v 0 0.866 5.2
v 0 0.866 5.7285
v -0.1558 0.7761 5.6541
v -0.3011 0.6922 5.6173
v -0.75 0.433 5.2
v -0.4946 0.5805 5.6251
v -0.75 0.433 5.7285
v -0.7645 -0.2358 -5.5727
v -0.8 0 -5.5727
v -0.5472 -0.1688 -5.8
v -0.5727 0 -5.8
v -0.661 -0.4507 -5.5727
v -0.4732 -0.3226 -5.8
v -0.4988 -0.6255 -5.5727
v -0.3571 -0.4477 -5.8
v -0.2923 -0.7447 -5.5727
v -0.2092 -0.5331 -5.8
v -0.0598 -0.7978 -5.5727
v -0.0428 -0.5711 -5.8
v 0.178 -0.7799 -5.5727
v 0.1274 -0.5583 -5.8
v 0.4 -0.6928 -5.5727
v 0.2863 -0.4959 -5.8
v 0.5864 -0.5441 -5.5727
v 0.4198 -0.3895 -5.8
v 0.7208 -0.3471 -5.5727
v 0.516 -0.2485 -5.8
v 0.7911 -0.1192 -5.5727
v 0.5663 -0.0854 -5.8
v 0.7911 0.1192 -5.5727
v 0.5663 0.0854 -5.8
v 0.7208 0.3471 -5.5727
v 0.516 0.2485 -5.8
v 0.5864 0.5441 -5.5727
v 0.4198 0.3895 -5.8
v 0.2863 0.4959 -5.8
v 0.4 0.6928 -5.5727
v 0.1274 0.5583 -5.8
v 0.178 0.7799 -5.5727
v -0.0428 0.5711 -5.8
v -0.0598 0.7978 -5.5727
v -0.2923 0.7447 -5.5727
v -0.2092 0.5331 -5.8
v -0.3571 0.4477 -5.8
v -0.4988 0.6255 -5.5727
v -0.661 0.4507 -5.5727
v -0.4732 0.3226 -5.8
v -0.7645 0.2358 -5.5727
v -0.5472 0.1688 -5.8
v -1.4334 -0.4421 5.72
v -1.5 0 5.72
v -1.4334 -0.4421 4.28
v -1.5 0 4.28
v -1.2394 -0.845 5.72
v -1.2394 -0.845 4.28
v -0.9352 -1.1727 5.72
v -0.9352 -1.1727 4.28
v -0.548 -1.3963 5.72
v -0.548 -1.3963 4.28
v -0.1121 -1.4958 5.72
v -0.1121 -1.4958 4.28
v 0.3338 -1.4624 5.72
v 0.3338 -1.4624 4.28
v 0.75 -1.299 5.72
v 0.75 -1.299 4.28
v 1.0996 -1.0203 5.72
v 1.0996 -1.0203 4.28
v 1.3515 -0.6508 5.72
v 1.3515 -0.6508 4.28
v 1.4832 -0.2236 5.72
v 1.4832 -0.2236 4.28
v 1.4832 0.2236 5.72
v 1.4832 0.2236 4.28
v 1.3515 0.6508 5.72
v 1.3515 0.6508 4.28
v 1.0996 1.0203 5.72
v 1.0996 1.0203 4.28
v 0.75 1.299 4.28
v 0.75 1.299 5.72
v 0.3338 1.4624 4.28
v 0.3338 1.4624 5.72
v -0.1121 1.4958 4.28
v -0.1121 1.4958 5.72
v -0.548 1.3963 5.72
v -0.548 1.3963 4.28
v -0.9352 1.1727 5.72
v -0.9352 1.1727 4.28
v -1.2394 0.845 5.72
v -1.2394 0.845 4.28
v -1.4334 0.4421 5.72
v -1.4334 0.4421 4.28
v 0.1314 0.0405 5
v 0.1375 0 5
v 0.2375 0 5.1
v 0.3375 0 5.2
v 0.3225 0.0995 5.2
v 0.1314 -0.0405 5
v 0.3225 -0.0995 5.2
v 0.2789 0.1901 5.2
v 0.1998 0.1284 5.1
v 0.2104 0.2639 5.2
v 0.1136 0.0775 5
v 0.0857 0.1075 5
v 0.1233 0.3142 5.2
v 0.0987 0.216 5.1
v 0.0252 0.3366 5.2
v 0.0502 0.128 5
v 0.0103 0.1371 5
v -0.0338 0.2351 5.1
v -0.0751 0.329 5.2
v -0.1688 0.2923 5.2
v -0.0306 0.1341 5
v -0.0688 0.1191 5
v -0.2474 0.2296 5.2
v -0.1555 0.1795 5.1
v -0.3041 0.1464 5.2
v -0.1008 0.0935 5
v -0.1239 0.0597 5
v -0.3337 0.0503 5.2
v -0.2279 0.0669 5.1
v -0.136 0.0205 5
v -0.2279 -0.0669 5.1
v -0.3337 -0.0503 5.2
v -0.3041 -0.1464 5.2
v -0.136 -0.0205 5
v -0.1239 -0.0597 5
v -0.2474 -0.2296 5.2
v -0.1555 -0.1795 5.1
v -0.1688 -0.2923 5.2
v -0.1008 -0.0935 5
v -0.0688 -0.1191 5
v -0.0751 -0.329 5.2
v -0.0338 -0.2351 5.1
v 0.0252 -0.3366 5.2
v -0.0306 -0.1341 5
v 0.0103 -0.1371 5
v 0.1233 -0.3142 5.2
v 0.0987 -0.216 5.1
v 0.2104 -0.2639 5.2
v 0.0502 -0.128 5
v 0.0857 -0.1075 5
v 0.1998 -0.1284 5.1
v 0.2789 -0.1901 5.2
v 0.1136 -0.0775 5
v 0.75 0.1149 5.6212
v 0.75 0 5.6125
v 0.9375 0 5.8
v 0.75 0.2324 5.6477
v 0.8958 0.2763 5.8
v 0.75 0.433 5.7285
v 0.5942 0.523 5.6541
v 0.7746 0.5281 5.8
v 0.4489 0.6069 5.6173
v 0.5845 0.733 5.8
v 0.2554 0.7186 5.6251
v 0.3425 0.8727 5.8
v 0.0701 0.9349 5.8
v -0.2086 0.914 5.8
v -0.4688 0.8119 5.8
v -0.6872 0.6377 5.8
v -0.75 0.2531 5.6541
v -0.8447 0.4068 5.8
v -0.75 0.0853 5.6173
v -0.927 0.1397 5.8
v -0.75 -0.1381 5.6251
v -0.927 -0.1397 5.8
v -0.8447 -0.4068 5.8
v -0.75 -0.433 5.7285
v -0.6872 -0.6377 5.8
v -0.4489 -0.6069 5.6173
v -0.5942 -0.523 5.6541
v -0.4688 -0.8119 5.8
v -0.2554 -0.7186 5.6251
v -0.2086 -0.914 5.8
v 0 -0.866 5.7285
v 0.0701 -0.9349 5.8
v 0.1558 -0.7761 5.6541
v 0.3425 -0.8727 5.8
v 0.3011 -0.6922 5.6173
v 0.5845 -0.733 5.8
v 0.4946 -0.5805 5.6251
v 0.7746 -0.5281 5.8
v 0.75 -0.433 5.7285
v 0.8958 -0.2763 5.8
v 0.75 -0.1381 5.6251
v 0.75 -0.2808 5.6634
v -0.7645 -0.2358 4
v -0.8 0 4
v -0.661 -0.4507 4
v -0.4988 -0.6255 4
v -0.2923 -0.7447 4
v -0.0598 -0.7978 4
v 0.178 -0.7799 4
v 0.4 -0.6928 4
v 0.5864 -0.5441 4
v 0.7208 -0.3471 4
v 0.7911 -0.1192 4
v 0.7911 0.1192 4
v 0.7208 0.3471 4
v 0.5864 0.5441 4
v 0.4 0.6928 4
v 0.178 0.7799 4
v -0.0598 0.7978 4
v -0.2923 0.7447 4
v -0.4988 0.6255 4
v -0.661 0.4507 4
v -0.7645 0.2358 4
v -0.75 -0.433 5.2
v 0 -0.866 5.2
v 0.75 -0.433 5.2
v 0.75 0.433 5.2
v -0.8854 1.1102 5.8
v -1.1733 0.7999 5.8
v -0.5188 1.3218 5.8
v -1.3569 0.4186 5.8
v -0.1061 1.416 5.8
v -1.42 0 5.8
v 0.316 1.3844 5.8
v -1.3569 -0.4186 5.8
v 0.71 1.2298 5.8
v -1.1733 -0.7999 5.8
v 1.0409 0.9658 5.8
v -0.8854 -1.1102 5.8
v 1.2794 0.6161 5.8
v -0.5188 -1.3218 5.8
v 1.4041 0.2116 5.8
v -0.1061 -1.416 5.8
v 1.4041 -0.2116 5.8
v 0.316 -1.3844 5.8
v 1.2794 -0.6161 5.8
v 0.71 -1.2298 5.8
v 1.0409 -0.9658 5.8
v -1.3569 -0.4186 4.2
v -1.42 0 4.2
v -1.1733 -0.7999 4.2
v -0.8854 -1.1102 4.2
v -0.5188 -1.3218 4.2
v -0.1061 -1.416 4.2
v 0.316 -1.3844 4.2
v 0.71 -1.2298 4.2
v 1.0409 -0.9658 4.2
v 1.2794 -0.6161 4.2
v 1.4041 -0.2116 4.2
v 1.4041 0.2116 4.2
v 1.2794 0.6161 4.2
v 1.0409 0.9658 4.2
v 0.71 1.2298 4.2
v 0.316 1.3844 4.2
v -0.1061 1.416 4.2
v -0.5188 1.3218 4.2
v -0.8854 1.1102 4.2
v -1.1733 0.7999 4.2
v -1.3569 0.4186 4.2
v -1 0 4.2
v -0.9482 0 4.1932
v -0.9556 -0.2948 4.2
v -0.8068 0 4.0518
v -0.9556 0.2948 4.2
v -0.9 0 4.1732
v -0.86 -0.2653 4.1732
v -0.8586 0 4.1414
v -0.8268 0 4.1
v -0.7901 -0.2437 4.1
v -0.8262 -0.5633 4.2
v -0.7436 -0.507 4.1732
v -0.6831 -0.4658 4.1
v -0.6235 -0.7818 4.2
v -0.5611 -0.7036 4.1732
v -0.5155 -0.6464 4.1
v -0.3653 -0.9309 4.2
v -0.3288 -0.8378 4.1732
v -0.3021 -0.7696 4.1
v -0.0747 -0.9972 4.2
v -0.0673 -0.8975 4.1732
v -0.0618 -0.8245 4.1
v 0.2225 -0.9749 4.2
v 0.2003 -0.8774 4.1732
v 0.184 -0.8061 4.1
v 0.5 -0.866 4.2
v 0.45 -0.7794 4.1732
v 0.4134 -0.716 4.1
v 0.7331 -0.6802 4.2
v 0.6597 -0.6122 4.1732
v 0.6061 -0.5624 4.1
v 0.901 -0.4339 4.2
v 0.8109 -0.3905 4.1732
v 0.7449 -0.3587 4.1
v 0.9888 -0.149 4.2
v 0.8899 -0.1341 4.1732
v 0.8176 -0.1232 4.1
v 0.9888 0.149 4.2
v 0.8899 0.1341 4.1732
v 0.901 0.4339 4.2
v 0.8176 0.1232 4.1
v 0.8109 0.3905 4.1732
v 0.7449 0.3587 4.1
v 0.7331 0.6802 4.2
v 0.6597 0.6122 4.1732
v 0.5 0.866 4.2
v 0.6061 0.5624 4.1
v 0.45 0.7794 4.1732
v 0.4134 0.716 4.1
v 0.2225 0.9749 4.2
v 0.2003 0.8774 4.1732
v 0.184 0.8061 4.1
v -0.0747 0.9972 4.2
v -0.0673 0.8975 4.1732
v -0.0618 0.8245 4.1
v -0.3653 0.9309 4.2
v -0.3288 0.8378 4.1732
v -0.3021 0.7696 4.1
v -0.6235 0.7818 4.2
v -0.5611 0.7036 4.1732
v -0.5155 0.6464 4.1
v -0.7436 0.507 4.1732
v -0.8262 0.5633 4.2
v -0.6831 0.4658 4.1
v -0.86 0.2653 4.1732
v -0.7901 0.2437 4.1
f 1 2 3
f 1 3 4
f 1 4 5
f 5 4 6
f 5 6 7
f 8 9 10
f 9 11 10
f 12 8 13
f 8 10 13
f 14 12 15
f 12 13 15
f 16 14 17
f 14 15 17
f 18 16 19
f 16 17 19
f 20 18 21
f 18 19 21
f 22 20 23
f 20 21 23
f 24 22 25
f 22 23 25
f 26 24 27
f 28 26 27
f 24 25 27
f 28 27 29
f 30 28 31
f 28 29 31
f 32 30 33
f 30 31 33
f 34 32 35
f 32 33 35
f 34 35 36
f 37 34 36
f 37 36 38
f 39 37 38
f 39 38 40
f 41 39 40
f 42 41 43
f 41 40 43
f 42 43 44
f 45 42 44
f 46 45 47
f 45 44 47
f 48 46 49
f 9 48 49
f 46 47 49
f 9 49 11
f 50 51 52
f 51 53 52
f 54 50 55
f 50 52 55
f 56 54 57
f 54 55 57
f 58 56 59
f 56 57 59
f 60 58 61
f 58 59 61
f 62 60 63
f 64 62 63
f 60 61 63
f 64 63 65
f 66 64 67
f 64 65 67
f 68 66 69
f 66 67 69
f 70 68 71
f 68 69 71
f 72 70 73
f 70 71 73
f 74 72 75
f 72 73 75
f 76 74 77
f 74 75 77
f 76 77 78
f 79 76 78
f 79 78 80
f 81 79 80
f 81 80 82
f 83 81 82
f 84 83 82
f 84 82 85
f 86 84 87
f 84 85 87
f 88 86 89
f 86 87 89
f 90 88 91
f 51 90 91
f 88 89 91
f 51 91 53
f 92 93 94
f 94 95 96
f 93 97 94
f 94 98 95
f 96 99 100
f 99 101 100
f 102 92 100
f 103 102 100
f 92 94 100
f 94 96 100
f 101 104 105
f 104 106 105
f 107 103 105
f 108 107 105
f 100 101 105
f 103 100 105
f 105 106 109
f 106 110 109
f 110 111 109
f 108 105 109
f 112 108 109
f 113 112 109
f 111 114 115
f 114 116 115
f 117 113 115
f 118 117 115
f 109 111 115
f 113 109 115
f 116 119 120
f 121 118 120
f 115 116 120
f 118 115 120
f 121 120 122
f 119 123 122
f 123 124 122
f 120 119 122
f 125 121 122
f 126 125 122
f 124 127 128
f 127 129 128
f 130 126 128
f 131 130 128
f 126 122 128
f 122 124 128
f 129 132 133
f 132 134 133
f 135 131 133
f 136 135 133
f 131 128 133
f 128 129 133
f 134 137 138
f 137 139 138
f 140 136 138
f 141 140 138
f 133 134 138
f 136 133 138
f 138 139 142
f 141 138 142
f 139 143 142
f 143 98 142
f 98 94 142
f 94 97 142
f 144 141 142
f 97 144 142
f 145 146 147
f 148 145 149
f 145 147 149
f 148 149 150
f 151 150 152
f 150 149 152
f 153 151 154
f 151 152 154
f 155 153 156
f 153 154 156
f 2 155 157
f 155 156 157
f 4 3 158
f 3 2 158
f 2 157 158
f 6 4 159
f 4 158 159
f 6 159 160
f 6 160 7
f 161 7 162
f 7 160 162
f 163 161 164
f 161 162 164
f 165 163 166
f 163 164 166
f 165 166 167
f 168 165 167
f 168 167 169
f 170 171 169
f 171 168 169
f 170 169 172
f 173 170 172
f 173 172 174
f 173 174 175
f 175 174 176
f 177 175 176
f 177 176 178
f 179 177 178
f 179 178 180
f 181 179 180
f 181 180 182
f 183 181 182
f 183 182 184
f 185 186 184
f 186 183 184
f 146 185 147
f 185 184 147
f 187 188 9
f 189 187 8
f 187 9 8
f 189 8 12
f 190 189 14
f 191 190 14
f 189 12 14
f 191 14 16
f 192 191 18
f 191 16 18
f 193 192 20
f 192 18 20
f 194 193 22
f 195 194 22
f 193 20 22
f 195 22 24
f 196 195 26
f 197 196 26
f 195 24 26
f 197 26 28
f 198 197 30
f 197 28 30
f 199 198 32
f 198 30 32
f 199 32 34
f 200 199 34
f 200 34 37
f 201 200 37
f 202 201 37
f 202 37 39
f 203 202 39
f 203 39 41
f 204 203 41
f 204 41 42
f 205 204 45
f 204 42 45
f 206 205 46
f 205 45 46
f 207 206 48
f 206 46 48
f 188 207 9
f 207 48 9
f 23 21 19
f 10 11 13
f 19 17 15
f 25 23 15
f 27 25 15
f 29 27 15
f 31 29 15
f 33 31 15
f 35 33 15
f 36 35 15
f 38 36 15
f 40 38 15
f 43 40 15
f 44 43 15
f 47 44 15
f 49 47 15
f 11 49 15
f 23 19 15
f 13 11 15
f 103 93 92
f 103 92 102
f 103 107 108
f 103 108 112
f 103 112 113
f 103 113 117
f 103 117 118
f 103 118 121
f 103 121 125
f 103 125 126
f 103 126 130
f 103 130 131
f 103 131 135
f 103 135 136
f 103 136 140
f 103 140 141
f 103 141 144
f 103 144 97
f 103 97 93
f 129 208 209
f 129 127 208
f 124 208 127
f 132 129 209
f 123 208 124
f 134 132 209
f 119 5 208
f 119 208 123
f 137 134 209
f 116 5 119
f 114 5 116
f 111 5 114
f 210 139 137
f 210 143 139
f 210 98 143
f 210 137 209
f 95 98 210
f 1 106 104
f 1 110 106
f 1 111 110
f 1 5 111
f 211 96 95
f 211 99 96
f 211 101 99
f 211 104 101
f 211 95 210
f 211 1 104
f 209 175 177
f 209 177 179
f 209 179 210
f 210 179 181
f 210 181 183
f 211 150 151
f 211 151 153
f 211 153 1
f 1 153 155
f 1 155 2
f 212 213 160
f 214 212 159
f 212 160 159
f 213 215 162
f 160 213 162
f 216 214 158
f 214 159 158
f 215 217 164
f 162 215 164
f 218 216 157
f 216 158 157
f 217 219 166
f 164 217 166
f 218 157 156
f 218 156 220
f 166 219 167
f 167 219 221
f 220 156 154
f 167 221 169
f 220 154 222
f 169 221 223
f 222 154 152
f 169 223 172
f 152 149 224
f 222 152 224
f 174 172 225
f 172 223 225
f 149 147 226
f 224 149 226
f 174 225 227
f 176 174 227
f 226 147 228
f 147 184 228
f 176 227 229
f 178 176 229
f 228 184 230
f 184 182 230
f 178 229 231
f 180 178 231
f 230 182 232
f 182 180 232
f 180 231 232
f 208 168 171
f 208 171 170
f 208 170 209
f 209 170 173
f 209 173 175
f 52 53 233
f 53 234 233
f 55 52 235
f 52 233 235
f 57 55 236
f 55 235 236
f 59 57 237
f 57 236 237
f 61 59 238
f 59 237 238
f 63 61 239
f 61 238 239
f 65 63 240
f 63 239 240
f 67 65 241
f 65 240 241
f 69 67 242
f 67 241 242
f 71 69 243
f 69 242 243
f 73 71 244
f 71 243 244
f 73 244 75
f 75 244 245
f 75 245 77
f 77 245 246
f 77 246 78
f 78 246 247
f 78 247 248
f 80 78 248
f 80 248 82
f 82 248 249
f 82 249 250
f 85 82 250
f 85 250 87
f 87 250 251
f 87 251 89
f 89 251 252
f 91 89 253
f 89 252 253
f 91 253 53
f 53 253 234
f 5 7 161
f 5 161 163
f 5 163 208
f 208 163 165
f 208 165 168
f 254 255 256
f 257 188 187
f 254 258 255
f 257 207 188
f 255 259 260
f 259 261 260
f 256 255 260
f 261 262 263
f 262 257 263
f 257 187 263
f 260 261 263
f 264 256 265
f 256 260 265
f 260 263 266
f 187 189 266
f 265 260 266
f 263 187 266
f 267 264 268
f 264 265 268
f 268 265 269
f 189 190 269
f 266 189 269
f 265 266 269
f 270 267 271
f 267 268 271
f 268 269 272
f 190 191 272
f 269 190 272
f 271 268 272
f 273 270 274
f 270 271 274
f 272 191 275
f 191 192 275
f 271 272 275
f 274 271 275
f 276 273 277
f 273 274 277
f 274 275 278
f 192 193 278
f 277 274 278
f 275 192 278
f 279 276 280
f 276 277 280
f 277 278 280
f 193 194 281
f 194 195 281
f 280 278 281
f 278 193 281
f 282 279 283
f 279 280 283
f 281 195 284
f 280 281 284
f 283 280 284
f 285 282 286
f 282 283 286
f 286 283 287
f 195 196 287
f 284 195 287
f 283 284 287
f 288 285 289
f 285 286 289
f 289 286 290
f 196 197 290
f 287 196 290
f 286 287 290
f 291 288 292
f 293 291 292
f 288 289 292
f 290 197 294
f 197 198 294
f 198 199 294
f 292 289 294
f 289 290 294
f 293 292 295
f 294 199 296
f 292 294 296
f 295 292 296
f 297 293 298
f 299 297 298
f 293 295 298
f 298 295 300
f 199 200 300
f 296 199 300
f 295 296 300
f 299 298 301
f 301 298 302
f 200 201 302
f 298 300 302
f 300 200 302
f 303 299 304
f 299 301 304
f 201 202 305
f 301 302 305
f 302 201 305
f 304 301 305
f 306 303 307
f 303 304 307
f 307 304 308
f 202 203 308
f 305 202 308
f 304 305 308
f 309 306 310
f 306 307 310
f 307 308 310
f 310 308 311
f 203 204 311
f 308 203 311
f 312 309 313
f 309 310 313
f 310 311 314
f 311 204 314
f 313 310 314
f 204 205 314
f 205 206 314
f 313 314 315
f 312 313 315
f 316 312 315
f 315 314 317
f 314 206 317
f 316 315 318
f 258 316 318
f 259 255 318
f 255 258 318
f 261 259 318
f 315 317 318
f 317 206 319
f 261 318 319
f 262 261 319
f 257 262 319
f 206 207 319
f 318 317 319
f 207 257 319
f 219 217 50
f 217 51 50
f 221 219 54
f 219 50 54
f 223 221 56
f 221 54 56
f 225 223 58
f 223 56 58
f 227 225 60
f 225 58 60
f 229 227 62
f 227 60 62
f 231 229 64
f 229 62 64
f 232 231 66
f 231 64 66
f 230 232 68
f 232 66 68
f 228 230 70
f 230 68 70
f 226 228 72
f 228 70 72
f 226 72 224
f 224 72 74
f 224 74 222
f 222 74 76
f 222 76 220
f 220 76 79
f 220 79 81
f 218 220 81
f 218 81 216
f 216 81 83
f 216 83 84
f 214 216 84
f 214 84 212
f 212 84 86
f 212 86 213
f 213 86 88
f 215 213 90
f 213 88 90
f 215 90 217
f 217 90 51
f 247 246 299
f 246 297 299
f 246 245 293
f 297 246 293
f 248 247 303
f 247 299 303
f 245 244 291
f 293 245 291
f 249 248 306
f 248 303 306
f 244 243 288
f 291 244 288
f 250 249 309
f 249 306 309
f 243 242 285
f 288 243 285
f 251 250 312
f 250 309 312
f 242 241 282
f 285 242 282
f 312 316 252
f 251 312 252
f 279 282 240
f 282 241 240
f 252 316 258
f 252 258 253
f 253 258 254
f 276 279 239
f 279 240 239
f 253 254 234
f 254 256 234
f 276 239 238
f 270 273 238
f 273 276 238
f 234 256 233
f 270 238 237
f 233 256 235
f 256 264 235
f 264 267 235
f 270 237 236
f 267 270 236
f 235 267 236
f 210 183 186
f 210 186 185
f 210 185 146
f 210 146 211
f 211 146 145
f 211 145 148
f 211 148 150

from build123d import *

# Parameters (mm, degrees)
CUT_EXTRUDE1_DEPTH = 0.6
SKETCH4_R          = 0.9375
CUT_EXTRUDE2_DEPTH = 0.8
CUT_EXTRUDE2_DRAFT = -45


with BuildPart() as part:
    # Sketch2 → Revolve1 (revolve)
    with BuildSketch(Plane(origin=(0, 0, 0), x_dir=(0, 0, -1), z_dir=(1, 0, 0)), mode=Mode.PRIVATE) as revolve1_sk:
        with BuildLine():
            Line((-5.8, 0), (-5.8, 1.42))
            Line((-5.8, 1.42), (-5.72, 1.5))
            Line((-5.72, 1.5), (-4.28, 1.5))
            Line((-4.28, 1.5), (-4.2, 1.42))
            Line((-4.2, 1.42), (-4.2, 1))
            ThreePointArc((-4.2, 1), (-4.141421356, 0.858578644), (-4, 0.8))
            Line((-4, 0.8), (5.572668332, 0.8))
            Line((5.572668332, 0.8), (5.8, 0.572668332))
            Line((5.8, 0.572668332), (5.8, 0))
            Line((5.8, 0), (-5.8, 0))
        make_face()
    revolve(revolve1_sk.sketch.rotate(Axis((0, 0, -5.8), (0, 0, 1)), 90), axis=Axis((0, 0, -5.8), (0, 0, 1)))

    # Sketch3 → Cut-Extrude1 (cut)
    with BuildSketch(Plane.XY.offset(5.8)):
        Polygon((0.75, -0.433012702), (0.75, 0.433012702), (0, 0.866025404), (-0.75, 0.433012702), (-0.75, -0.433012702), (0, -0.866025404), align=None)
    extrude(amount=-CUT_EXTRUDE1_DEPTH, mode=Mode.SUBTRACT)


with BuildPart() as cut_extrude2_tool:
    # Sketch4 → Cut-Extrude2 (with draft: the straight prism first)
    with BuildSketch(Plane.XY.offset(5.8)):
        Circle(SKETCH4_R)
    extrude(amount=-CUT_EXTRUDE2_DEPTH)
    # Cut-Extrude2: the draft: its side faces are tilted about the plane it starts from
    cut_extrude2_sides = [cut_extrude2_tool.faces().sort_by_distance(p)[0] for p in [
        (-0.9375, 0, 5.4),
    ]]
    draft(cut_extrude2_sides, Plane.XY.offset(5.8), CUT_EXTRUDE2_DRAFT)


with BuildPart() as part_1:
    add(part.part)

    # Cut-Extrude2: cut by cut_extrude2_tool
    add(cut_extrude2_tool.part, mode=Mode.SUBTRACT)


solid = part_1.part
